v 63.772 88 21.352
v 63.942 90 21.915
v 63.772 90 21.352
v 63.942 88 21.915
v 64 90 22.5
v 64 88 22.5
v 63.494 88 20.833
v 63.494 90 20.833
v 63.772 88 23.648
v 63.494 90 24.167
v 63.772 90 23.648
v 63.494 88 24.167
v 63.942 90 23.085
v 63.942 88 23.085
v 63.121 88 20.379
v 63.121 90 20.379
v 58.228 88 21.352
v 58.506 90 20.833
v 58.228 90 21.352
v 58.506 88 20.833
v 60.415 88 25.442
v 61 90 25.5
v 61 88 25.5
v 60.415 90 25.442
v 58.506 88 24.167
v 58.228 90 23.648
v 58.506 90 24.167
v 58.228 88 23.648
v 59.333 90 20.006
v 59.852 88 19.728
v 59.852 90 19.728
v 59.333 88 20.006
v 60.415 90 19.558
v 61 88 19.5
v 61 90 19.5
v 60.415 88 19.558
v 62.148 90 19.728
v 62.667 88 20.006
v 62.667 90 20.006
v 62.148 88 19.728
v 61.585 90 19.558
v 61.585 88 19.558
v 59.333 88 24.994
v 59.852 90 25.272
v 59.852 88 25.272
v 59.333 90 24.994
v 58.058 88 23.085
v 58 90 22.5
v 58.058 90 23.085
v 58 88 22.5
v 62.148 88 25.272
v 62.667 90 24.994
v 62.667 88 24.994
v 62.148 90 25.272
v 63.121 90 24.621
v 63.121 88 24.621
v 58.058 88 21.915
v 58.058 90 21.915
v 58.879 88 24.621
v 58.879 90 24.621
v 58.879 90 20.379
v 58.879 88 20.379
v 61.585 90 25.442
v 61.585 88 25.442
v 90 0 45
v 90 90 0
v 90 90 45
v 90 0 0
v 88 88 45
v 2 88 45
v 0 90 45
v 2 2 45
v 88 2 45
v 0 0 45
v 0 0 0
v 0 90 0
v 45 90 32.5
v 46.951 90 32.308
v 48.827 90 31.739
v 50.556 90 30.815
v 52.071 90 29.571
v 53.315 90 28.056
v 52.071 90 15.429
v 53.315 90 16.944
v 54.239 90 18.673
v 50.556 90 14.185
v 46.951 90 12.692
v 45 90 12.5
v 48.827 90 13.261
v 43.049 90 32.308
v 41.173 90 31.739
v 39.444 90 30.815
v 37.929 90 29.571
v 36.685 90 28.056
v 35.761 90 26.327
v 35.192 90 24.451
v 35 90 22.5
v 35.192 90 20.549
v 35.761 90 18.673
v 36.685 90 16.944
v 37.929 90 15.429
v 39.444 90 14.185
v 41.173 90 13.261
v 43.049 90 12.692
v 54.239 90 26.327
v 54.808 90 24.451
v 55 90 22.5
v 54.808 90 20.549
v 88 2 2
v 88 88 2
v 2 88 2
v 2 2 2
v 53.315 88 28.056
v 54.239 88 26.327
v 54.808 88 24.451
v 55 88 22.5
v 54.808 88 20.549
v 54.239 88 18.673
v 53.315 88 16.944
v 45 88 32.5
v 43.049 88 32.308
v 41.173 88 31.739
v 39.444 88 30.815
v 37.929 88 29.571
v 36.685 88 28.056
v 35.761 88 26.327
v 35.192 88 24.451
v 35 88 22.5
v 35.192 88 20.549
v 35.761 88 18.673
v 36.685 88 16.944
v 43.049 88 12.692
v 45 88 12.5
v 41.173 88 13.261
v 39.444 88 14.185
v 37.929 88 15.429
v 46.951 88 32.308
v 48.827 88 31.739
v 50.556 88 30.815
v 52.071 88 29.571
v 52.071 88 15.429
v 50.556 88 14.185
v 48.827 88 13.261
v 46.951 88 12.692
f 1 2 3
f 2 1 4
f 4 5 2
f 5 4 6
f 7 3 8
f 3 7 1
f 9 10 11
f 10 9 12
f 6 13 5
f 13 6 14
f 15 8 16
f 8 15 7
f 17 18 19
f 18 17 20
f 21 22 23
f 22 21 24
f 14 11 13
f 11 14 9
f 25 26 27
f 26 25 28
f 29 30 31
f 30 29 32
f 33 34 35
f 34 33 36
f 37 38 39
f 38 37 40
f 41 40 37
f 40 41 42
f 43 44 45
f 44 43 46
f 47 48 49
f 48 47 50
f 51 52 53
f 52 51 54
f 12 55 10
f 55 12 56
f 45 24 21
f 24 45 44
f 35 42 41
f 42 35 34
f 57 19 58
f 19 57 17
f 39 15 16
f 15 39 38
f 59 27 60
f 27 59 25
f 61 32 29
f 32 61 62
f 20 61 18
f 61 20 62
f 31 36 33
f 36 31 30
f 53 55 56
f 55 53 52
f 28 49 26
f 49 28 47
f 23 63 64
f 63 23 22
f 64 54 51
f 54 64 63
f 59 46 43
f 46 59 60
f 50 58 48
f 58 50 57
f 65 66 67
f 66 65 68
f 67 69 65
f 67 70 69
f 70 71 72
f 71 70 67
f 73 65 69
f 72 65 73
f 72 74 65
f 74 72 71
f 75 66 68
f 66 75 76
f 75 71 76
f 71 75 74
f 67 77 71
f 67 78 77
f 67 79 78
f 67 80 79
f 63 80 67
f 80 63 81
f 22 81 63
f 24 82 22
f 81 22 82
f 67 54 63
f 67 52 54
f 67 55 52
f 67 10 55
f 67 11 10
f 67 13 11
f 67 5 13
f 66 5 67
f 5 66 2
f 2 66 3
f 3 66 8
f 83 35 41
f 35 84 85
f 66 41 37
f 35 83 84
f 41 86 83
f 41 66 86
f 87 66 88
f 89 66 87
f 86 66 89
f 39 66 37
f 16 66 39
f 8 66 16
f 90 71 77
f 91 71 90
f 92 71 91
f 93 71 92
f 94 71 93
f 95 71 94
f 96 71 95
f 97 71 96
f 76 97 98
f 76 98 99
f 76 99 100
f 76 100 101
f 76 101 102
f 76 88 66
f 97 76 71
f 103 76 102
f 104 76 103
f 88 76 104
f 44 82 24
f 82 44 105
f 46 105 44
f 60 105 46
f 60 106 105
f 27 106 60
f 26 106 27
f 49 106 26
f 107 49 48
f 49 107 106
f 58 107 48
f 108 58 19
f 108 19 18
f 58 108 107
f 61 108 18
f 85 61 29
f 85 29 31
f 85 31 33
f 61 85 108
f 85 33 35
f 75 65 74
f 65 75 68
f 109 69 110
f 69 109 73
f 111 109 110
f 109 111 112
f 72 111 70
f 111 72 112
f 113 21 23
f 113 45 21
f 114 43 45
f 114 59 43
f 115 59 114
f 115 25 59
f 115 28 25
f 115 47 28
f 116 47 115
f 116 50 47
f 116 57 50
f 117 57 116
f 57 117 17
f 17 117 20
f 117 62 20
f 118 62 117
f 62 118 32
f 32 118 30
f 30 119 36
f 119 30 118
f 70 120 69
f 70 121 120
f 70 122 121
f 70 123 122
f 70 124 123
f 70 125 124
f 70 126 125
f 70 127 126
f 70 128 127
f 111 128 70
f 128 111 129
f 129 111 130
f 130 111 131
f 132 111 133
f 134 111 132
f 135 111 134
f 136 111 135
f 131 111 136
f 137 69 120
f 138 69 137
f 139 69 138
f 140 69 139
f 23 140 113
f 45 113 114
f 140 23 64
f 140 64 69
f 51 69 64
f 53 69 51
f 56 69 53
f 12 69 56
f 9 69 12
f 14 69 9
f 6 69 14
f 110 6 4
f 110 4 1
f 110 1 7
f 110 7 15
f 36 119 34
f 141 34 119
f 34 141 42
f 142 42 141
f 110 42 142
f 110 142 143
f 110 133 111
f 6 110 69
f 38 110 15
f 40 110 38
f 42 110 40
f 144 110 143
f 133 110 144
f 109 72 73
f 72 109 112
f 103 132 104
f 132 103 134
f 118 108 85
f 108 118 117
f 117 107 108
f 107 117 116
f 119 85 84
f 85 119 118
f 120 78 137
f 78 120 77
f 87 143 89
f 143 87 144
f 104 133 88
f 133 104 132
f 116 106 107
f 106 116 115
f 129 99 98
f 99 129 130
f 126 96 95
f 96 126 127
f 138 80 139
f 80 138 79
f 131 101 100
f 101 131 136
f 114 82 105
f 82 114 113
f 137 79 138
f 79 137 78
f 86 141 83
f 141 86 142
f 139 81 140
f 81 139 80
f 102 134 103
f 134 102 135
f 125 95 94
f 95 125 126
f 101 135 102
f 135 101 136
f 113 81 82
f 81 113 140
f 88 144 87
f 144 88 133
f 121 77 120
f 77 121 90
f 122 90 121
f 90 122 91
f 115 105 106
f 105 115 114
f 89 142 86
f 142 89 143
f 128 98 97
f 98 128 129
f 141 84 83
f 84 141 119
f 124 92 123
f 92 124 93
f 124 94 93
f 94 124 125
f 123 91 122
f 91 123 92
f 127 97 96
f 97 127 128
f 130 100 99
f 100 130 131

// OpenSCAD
$fn = 32;

// ----------------------------------------------------------------------
// Vent box: roundvent enclosure
// ----------------------------------------------------------------------

// --- parameters (mm) ---
box_l = 90;               // box length, X
box_w = 90;               // box width, Y
box_h = 45;               // box height, Z
wall_t = 2;               // shell wall thickness
vent_d = 20;              // central vent diameter
ring_d = 6;               // ring hole diameter
n_ring = 6;               // holes in the ring
ring_r = 16;              // ring radius

ring_step = 360 / n_ring;  // ring hole angular step

difference() {
  cube([box_l, box_w, box_h]);
  translate([wall_t, wall_t, wall_t])
    cube([box_l - 2 * wall_t, box_w - 2 * wall_t, box_h]);
  translate([box_l / 2, box_w - wall_t - 1, box_h / 2])
    rotate([-90, 0, 0]) cylinder(h = wall_t + 2, d = vent_d);
  for (i = [0 : n_ring - 1])
    translate([box_l / 2, box_w - wall_t - 1, box_h / 2])
      rotate([0, 0, i * ring_step])
        translate([ring_r, 0, 0]) rotate([-90, 0, 0])
          cylinder(h = wall_t + 2, d = ring_d);
}
